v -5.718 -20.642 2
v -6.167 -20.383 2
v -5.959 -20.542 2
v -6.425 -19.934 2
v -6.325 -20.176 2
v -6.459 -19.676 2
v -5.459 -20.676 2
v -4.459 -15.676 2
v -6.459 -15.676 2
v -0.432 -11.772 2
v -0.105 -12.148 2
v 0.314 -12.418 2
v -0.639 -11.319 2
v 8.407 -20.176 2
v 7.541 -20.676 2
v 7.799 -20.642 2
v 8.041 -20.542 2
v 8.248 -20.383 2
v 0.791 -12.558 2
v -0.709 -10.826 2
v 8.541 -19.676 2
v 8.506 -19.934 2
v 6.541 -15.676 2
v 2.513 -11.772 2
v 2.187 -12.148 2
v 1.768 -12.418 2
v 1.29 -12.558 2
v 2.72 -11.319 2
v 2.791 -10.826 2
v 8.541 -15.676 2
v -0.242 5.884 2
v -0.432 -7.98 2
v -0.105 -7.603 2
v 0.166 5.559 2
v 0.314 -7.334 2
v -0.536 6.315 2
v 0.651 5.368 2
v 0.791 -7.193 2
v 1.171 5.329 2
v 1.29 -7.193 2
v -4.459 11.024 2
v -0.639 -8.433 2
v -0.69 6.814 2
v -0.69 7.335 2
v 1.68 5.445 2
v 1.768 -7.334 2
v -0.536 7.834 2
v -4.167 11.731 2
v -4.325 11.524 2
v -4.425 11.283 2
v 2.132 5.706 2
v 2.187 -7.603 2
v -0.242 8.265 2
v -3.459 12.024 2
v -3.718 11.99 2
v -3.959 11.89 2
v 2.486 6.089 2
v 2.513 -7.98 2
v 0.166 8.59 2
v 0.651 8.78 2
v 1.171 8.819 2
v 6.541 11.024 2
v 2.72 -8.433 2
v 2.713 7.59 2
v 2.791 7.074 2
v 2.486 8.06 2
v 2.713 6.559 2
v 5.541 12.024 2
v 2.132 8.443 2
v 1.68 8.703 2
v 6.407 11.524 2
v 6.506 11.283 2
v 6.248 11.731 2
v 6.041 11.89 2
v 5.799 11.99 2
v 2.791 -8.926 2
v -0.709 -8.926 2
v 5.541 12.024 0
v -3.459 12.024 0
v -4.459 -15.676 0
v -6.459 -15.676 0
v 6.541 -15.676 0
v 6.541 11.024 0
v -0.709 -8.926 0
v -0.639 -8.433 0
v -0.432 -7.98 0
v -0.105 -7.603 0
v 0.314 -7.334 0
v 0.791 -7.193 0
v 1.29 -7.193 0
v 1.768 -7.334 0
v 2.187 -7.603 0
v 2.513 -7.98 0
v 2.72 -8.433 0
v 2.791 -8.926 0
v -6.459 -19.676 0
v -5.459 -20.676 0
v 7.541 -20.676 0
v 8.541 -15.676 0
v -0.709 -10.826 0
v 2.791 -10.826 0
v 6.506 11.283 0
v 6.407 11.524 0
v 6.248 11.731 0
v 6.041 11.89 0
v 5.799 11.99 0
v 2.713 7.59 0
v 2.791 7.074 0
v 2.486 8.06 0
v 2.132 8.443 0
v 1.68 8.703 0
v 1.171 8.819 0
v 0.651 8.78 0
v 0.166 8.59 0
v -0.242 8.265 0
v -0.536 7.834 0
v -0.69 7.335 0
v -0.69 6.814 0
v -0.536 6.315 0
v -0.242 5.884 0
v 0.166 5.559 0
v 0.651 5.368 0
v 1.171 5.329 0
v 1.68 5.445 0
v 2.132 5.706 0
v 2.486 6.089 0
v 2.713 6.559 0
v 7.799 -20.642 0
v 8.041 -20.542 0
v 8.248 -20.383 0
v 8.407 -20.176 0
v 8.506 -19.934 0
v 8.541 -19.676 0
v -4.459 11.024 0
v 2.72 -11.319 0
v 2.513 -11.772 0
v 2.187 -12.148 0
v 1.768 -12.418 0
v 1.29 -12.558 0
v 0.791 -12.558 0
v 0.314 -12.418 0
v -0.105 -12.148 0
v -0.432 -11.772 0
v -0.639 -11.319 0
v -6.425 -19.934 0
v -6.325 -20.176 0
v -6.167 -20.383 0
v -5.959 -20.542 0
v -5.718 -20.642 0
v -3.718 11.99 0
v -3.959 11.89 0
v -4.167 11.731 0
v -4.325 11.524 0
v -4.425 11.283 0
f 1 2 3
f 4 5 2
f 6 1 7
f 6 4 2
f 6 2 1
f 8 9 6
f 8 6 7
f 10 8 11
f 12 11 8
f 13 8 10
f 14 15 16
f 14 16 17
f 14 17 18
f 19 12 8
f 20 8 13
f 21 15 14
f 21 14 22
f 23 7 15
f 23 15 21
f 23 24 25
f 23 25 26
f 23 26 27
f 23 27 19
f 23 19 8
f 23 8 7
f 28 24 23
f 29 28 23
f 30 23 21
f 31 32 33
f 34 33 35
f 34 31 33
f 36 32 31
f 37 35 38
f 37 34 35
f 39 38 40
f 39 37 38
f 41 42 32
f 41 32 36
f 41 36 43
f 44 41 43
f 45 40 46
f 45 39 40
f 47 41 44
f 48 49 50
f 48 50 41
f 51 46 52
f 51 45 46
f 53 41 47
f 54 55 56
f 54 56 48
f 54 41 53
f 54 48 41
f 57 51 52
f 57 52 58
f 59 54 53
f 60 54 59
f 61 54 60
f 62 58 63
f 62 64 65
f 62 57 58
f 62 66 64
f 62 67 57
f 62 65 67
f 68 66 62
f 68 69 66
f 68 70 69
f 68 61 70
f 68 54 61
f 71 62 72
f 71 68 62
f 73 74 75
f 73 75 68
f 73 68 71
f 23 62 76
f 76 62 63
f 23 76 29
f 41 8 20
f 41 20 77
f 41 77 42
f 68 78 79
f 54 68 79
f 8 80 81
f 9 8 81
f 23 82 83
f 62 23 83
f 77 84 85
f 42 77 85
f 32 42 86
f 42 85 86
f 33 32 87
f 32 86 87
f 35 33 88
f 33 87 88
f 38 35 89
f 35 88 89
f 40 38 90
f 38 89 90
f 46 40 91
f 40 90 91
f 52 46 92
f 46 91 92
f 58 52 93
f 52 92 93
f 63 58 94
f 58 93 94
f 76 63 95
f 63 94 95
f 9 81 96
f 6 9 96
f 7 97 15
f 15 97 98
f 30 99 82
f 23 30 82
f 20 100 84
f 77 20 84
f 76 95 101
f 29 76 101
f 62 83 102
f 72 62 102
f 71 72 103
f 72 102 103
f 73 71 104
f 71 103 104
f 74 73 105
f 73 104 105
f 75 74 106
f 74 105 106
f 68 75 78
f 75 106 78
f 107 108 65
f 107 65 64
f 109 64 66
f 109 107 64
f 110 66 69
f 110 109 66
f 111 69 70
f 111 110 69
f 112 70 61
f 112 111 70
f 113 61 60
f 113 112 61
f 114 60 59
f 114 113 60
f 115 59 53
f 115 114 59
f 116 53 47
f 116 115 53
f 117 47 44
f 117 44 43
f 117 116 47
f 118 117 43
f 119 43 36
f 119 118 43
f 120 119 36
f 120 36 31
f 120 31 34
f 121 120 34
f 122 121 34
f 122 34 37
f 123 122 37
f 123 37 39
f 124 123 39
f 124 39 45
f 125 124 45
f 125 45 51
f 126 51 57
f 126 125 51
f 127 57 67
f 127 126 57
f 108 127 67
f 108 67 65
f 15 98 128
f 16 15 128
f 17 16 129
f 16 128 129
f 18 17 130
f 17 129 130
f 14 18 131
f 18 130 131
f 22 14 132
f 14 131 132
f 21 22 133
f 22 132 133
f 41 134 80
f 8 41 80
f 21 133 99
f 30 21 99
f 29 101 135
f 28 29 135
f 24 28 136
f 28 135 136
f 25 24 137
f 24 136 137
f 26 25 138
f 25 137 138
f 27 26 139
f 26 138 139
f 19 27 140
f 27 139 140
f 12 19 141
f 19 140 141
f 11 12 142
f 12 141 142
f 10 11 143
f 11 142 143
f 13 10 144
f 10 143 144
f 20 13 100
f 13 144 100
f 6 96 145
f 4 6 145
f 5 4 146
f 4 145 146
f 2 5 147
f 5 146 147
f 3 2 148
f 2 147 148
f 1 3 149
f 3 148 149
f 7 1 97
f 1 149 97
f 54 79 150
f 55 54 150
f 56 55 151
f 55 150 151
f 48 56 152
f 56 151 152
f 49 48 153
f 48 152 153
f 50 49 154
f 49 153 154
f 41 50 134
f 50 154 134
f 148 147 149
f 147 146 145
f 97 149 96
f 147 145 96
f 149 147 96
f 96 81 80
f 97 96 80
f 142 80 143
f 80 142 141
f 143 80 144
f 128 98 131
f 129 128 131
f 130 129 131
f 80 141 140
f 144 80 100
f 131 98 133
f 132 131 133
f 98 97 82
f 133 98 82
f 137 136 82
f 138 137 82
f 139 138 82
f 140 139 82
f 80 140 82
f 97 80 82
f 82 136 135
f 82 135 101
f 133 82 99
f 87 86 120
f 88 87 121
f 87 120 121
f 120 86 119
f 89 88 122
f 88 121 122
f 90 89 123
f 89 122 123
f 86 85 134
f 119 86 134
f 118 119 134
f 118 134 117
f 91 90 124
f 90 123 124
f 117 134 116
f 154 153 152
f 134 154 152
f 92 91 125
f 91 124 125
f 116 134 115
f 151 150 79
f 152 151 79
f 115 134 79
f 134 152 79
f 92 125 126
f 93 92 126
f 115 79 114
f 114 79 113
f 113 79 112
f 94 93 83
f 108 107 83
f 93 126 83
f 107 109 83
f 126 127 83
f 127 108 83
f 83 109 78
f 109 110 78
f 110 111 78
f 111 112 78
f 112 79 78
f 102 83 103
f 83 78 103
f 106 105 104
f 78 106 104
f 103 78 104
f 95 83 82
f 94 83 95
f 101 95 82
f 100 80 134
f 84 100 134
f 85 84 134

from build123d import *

# Parameters (mm, degrees)
IZIM1_R                     = 1.75
Y_KSEKLIK_EKSTR_ZYON1_DEPTH = 2


with BuildPart() as part:
    # Çizim1 → Yükseklik-Ekstrüzyon1 (new body)
    with BuildSketch(Plane.XY):
        with BuildLine():
            Line((-4.459459459, -15.675675676), (-6.459459459, -15.675675676))
            Line((-6.459459459, -15.675675676), (-6.459459459, -19.675675676))
            ThreePointArc((-6.459459459, -19.675675676), (-6.166566241, -20.382782457), (-5.459459459, -20.675675676))
            Line((-5.459459459, -20.675675676), (7.540540541, -20.675675676))
            ThreePointArc((7.540540541, -20.675675676), (8.247647322, -20.382782457), (8.540540541, -19.675675676))
            Line((8.540540541, -19.675675676), (8.540540541, -15.675675676))
            Line((8.540540541, -15.675675676), (6.540540541, -15.675675676))
            Line((6.540540541, -15.675675676), (6.540540541, 11.024324324))
            ThreePointArc((6.540540541, 11.024324324), (6.247647322, 11.731431106), (5.540540541, 12.024324324))
            Line((5.540540541, 12.024324324), (-3.459459459, 12.024324324))
            ThreePointArc((-3.459459459, 12.024324324), (-4.166566241, 11.731431106), (-4.459459459, 11.024324324))
            Line((-4.459459459, 11.024324324), (-4.459459459, -15.675675676))
        make_face()
        with Locations((1.040540541, 7.074324324)):
            Circle(IZIM1_R, mode=Mode.SUBTRACT)
        with BuildLine():
            Line((-0.709459459, -10.825675676), (-0.709459459, -8.925675676))
            ThreePointArc((-0.709459459, -8.925675676), (1.040540541, -7.175675676), (2.790540541, -8.925675676))
            Line((2.790540541, -8.925675676), (2.790540541, -10.825675676))
            ThreePointArc((2.790540541, -10.825675676), (1.040540541, -12.575675676), (-0.709459459, -10.825675676))
        make_face(mode=Mode.SUBTRACT)
    extrude(amount=Y_KSEKLIK_EKSTR_ZYON1_DEPTH)


solid = part.part
